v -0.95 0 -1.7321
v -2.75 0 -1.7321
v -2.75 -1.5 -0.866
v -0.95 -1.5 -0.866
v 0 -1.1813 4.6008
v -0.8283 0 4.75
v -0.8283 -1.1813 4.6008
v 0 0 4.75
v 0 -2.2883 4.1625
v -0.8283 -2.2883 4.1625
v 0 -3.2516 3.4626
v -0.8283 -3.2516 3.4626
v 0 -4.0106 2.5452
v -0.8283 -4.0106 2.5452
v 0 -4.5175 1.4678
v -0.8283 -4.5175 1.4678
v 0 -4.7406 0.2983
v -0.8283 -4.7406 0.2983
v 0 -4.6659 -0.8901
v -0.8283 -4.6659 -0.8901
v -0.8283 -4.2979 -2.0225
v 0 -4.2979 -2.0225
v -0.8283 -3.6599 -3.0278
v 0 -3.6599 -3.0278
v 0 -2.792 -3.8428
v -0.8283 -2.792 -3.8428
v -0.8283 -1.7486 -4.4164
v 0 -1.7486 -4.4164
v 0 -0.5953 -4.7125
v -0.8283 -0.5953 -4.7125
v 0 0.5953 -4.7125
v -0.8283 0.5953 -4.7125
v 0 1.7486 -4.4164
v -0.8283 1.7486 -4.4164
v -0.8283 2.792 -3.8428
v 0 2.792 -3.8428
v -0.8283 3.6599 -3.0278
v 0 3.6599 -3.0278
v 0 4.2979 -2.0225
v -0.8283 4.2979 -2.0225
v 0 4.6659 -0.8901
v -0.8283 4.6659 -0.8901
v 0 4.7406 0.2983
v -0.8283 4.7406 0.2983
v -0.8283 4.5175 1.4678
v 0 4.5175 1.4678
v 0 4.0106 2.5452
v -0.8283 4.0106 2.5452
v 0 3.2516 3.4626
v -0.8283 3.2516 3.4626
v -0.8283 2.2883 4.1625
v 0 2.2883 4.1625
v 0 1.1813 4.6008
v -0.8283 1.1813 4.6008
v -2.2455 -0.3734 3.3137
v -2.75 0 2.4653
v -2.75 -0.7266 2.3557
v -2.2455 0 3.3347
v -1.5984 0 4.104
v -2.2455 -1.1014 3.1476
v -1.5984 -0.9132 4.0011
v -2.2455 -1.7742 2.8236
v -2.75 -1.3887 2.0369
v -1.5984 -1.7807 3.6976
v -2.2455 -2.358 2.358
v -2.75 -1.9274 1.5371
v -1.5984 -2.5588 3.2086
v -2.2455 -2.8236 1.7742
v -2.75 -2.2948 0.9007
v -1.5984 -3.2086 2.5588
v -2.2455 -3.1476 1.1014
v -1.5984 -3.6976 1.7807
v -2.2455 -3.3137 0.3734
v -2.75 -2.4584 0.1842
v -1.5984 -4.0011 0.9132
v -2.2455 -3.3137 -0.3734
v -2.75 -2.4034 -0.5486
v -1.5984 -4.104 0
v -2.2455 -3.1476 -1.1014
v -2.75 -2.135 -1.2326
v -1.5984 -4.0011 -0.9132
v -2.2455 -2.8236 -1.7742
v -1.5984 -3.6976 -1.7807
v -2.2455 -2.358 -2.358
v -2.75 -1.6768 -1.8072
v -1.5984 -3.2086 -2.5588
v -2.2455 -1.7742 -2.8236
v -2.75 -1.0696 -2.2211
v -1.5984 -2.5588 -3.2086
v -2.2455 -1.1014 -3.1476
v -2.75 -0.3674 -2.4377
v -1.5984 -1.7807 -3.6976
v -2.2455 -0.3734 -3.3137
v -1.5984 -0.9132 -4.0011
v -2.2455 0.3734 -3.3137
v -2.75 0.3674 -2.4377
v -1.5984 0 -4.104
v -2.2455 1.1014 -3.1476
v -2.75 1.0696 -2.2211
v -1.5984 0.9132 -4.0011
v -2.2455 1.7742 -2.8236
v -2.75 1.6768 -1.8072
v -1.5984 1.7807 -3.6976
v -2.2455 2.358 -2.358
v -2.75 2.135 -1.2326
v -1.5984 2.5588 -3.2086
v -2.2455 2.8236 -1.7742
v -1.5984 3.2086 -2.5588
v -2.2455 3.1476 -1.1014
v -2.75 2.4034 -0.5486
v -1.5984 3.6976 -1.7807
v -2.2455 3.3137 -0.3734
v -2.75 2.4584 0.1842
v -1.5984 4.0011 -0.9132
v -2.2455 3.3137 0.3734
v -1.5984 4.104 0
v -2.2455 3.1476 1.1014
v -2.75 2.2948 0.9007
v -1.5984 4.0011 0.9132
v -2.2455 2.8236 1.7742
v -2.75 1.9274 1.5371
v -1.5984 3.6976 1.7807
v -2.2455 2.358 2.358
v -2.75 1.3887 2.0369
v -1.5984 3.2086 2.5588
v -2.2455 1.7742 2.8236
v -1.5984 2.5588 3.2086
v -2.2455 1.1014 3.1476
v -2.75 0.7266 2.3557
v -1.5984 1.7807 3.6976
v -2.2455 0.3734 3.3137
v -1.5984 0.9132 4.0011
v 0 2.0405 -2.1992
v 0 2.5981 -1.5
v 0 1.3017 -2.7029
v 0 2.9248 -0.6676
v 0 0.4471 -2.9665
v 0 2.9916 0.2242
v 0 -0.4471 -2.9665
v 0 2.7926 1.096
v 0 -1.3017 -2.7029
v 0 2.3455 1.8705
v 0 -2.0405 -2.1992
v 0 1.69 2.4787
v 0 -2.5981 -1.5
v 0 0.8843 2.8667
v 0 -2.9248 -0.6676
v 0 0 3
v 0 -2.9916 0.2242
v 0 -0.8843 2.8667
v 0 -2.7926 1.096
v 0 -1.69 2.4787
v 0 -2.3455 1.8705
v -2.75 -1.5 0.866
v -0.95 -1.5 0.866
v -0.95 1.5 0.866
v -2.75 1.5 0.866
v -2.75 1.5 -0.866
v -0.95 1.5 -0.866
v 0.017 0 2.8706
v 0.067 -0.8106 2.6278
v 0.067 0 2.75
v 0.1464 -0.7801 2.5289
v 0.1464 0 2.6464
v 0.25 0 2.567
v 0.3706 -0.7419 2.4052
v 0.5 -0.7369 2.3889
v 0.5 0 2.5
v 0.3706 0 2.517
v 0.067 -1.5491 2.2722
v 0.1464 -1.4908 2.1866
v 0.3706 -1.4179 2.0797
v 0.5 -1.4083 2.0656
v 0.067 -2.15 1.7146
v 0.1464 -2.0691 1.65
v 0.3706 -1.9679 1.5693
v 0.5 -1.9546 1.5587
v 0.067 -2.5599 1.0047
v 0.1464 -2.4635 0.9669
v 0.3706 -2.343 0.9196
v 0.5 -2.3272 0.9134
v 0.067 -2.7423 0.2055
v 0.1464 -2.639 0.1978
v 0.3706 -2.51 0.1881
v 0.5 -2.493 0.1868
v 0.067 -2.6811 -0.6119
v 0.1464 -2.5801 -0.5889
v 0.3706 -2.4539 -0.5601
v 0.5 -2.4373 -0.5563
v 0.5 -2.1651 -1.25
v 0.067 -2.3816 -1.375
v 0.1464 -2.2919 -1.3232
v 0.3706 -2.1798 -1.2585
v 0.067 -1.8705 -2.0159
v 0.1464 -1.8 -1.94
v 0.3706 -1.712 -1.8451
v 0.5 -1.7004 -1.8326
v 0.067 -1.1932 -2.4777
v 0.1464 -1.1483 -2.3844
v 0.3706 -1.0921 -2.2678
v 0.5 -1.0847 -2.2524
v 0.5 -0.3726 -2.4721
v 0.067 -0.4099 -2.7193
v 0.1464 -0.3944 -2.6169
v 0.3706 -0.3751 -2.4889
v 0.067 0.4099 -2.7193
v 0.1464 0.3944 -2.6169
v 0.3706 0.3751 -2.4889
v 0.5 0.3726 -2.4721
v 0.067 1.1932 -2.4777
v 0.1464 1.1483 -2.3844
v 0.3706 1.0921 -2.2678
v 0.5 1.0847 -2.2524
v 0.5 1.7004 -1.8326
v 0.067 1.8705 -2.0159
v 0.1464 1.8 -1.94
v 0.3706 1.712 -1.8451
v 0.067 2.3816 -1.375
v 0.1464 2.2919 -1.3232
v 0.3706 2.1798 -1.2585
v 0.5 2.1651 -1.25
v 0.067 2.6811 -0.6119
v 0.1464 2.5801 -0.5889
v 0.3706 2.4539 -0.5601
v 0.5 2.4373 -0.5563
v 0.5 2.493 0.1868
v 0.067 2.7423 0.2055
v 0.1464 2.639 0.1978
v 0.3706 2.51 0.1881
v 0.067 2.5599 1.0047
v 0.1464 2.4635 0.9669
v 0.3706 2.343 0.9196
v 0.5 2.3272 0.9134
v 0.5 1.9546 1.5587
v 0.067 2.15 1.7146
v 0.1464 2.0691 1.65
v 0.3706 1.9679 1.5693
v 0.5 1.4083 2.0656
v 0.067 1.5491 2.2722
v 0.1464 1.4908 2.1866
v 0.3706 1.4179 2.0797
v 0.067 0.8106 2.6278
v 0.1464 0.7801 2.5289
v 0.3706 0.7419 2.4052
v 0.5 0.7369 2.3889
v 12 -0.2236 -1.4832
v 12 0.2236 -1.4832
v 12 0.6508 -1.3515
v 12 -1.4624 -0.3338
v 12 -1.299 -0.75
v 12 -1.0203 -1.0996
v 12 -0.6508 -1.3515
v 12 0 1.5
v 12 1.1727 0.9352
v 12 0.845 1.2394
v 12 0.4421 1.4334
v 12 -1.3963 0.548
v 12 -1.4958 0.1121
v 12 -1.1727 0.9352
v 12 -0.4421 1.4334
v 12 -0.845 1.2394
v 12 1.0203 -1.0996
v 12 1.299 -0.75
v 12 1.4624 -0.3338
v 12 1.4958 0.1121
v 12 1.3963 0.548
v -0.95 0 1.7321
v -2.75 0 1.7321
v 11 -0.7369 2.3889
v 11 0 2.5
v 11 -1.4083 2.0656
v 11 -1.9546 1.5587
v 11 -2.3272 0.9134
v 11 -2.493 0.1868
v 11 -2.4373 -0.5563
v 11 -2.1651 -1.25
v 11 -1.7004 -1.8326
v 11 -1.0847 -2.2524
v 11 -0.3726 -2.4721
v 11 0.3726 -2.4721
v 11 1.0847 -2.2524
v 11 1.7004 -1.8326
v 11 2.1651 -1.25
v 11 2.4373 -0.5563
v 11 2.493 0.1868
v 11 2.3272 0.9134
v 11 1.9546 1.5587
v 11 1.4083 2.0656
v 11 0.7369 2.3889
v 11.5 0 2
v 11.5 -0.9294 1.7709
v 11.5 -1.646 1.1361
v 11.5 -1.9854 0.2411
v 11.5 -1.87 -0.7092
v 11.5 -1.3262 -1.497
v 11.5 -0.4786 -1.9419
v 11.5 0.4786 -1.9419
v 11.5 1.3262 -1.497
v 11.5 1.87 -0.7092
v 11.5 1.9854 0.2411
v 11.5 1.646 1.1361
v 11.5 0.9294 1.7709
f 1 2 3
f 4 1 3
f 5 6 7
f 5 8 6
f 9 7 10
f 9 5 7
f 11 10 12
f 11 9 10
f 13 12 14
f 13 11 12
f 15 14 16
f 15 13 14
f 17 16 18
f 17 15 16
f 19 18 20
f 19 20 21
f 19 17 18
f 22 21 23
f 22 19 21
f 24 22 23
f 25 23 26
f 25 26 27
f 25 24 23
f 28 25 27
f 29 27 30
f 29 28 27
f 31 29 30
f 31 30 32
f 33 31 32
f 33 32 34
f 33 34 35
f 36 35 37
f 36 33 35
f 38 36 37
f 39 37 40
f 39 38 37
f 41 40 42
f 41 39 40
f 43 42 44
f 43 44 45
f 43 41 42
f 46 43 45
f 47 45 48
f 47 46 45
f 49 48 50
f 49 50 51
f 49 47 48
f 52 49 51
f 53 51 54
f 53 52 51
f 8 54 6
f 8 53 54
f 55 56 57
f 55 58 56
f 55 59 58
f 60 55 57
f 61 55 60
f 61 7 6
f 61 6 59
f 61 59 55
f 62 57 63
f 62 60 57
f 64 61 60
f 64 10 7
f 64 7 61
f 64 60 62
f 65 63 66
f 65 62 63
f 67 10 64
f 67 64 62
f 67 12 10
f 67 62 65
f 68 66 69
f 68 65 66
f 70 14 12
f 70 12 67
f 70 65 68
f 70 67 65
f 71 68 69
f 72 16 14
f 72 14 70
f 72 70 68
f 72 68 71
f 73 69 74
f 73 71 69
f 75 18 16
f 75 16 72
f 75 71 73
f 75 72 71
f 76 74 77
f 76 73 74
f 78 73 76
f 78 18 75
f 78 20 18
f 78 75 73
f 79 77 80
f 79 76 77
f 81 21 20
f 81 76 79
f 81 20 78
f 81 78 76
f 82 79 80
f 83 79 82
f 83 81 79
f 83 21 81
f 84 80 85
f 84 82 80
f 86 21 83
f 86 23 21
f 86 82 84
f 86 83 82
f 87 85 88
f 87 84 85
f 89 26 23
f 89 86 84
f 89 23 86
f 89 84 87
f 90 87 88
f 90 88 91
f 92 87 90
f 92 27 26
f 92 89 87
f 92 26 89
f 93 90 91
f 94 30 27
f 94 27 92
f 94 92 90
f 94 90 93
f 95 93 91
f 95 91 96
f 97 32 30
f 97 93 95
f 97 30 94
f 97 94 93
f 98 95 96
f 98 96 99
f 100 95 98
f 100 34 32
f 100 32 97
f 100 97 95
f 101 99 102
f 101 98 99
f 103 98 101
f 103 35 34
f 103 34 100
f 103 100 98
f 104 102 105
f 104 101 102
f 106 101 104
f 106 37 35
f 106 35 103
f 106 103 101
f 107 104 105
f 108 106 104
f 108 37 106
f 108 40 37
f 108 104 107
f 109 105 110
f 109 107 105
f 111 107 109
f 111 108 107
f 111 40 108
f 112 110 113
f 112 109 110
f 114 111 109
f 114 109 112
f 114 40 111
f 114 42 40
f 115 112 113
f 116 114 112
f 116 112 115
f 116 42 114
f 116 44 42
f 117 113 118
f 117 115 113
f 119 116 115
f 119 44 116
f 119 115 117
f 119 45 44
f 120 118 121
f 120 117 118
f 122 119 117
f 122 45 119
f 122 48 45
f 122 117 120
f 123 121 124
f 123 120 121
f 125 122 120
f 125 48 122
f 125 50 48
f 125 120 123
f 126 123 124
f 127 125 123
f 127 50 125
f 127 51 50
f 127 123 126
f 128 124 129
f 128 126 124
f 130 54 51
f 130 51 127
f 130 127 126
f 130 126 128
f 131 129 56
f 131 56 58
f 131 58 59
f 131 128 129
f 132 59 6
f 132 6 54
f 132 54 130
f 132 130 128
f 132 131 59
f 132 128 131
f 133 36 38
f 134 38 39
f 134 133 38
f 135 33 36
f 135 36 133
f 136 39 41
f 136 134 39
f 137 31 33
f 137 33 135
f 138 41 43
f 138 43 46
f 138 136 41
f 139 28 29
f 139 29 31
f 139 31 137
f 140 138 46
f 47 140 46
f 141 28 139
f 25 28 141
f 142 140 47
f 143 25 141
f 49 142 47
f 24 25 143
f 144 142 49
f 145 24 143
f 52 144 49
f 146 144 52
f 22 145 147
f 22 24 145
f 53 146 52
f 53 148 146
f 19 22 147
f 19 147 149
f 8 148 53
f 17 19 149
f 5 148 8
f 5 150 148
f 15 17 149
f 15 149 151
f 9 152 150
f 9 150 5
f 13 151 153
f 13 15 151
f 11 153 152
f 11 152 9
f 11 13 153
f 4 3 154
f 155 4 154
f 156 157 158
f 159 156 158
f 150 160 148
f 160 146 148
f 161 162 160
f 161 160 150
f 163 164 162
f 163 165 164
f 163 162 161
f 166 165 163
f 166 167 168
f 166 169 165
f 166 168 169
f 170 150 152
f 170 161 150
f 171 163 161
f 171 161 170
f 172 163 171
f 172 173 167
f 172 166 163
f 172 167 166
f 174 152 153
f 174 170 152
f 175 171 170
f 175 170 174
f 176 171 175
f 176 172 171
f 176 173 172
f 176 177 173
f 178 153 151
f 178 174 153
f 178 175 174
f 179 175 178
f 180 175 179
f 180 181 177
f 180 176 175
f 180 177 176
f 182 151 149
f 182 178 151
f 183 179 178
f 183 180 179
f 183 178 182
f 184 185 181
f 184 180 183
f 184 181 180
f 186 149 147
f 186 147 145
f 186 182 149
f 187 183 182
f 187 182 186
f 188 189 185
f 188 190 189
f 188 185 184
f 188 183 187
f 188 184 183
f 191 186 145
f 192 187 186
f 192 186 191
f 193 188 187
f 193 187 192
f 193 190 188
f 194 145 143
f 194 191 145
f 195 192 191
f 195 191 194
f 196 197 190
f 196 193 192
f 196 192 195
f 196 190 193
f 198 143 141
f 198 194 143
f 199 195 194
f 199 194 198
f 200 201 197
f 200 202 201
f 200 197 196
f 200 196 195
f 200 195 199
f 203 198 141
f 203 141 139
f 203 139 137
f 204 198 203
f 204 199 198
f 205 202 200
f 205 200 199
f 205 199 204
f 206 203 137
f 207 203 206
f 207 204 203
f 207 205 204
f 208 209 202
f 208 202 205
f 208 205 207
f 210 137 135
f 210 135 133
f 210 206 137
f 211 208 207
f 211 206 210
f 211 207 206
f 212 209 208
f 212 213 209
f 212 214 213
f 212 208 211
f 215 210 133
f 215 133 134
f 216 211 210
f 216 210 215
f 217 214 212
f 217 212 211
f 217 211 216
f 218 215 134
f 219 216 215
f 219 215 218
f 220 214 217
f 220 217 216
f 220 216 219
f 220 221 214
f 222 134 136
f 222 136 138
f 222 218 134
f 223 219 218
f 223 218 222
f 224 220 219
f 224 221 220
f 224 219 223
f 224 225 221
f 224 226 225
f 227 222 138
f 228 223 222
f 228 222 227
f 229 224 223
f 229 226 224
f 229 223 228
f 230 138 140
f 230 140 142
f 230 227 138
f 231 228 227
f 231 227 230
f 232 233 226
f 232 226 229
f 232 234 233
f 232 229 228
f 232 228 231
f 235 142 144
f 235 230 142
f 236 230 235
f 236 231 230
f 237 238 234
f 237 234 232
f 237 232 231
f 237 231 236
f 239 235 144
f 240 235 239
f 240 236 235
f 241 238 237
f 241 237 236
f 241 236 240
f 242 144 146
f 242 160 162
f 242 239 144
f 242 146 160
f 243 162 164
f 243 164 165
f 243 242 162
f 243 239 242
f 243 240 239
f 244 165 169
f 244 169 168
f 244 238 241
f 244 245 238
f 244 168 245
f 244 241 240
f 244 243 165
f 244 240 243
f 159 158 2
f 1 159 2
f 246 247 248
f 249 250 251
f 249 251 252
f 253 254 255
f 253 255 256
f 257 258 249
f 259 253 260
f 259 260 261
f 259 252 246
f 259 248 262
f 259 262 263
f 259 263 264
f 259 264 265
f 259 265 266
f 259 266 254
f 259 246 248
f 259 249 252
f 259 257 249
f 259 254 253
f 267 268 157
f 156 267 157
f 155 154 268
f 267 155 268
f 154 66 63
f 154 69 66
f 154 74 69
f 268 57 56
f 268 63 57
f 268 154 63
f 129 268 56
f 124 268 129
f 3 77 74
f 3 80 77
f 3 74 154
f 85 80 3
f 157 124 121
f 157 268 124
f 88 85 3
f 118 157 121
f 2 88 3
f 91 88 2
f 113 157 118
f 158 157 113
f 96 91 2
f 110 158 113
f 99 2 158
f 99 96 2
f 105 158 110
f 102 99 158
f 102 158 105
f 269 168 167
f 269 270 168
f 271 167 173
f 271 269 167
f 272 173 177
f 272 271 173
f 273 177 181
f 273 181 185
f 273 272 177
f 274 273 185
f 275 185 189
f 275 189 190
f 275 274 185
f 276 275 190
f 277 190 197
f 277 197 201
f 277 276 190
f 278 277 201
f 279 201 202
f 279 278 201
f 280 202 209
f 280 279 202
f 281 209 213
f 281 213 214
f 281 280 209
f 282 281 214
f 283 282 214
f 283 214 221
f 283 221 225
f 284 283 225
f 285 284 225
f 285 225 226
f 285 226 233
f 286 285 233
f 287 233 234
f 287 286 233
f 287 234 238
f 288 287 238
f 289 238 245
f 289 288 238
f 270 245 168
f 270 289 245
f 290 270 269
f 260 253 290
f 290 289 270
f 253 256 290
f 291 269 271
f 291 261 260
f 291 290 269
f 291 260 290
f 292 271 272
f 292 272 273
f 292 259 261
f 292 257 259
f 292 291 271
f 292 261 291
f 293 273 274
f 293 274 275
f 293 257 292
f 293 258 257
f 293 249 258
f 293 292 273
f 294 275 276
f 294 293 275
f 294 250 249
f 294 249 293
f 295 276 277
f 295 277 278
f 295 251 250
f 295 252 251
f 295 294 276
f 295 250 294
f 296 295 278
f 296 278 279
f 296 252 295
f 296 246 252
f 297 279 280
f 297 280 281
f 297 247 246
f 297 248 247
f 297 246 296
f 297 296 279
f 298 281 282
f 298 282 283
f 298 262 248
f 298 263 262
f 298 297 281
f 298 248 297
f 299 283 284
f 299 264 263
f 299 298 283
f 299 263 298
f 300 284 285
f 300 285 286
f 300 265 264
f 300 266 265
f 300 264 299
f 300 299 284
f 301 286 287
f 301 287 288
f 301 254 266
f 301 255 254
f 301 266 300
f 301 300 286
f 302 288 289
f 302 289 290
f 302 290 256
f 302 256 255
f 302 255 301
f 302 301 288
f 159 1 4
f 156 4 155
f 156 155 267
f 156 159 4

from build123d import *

# Parameters (mm, degrees)
CUT_EXTRUDE_1_DEPTH      = 14.752272539
CUT_EXTRUDE_1_DEPTH_BACK = 14.752272539
CUT_EXTRUDE_2_DEPTH      = 1.8


with BuildPart() as part:
    # Эскиз1 → Revolve 663 (revolve)
    with BuildSketch(Plane.XY, mode=Mode.PRIVATE) as revolve_663_sk:
        with BuildLine():
            Line((0, 4.75), (0, 3))
            ThreePointArc((0, 3), (0.146446609, 2.646446609), (0.5, 2.5))
            Line((0.5, 2.5), (11, 2.5))
            Line((11, 2.5), (12, 1.5))
            Line((12, 1.5), (12, 0))
            Line((12, 0), (-3.3, 0))
            ThreePointArc((-3.3, 0), (-2.645098129, 2.677305593), (-0.828287848, 4.75))
            Line((-0.828287848, 4.75), (0, 4.75))
        make_face()
    revolve(revolve_663_sk.sketch.rotate(Axis((-6.611599553, 0, 0), (1, 0, 0)), 90), axis=Axis((-6.611599553, 0, 0), (1, 0, 0)))

    # Эскиз2 → Вырез-Вытянуть1 (cut, two sides: drawn at the far end of the back side and taken through both)
    with BuildSketch(Plane.XY.offset(-CUT_EXTRUDE_1_DEPTH_BACK)):
        Polygon((-2.75, 45.30562747), (-2.75, 2.465258607), (-2.75, -2.465258607), (-2.75, -45.30562747), (-88.430737726, -45.30562747), (-88.430737726, 45.30562747), align=None)
    extrude(amount=CUT_EXTRUDE_1_DEPTH + CUT_EXTRUDE_1_DEPTH_BACK, mode=Mode.SUBTRACT)

    # Эскиз3 → Вырез-Вытянуть2 (cut)
    with BuildSketch(Plane.ZY.offset(2.75)):
        Polygon((-1.732050808, 0), (-0.866025404, -1.5), (0.866025404, -1.5), (1.732050808, 0), (0.866025404, 1.5), (-0.866025404, 1.5), align=None)
    extrude(amount=-CUT_EXTRUDE_2_DEPTH, mode=Mode.SUBTRACT)


solid = part.part
